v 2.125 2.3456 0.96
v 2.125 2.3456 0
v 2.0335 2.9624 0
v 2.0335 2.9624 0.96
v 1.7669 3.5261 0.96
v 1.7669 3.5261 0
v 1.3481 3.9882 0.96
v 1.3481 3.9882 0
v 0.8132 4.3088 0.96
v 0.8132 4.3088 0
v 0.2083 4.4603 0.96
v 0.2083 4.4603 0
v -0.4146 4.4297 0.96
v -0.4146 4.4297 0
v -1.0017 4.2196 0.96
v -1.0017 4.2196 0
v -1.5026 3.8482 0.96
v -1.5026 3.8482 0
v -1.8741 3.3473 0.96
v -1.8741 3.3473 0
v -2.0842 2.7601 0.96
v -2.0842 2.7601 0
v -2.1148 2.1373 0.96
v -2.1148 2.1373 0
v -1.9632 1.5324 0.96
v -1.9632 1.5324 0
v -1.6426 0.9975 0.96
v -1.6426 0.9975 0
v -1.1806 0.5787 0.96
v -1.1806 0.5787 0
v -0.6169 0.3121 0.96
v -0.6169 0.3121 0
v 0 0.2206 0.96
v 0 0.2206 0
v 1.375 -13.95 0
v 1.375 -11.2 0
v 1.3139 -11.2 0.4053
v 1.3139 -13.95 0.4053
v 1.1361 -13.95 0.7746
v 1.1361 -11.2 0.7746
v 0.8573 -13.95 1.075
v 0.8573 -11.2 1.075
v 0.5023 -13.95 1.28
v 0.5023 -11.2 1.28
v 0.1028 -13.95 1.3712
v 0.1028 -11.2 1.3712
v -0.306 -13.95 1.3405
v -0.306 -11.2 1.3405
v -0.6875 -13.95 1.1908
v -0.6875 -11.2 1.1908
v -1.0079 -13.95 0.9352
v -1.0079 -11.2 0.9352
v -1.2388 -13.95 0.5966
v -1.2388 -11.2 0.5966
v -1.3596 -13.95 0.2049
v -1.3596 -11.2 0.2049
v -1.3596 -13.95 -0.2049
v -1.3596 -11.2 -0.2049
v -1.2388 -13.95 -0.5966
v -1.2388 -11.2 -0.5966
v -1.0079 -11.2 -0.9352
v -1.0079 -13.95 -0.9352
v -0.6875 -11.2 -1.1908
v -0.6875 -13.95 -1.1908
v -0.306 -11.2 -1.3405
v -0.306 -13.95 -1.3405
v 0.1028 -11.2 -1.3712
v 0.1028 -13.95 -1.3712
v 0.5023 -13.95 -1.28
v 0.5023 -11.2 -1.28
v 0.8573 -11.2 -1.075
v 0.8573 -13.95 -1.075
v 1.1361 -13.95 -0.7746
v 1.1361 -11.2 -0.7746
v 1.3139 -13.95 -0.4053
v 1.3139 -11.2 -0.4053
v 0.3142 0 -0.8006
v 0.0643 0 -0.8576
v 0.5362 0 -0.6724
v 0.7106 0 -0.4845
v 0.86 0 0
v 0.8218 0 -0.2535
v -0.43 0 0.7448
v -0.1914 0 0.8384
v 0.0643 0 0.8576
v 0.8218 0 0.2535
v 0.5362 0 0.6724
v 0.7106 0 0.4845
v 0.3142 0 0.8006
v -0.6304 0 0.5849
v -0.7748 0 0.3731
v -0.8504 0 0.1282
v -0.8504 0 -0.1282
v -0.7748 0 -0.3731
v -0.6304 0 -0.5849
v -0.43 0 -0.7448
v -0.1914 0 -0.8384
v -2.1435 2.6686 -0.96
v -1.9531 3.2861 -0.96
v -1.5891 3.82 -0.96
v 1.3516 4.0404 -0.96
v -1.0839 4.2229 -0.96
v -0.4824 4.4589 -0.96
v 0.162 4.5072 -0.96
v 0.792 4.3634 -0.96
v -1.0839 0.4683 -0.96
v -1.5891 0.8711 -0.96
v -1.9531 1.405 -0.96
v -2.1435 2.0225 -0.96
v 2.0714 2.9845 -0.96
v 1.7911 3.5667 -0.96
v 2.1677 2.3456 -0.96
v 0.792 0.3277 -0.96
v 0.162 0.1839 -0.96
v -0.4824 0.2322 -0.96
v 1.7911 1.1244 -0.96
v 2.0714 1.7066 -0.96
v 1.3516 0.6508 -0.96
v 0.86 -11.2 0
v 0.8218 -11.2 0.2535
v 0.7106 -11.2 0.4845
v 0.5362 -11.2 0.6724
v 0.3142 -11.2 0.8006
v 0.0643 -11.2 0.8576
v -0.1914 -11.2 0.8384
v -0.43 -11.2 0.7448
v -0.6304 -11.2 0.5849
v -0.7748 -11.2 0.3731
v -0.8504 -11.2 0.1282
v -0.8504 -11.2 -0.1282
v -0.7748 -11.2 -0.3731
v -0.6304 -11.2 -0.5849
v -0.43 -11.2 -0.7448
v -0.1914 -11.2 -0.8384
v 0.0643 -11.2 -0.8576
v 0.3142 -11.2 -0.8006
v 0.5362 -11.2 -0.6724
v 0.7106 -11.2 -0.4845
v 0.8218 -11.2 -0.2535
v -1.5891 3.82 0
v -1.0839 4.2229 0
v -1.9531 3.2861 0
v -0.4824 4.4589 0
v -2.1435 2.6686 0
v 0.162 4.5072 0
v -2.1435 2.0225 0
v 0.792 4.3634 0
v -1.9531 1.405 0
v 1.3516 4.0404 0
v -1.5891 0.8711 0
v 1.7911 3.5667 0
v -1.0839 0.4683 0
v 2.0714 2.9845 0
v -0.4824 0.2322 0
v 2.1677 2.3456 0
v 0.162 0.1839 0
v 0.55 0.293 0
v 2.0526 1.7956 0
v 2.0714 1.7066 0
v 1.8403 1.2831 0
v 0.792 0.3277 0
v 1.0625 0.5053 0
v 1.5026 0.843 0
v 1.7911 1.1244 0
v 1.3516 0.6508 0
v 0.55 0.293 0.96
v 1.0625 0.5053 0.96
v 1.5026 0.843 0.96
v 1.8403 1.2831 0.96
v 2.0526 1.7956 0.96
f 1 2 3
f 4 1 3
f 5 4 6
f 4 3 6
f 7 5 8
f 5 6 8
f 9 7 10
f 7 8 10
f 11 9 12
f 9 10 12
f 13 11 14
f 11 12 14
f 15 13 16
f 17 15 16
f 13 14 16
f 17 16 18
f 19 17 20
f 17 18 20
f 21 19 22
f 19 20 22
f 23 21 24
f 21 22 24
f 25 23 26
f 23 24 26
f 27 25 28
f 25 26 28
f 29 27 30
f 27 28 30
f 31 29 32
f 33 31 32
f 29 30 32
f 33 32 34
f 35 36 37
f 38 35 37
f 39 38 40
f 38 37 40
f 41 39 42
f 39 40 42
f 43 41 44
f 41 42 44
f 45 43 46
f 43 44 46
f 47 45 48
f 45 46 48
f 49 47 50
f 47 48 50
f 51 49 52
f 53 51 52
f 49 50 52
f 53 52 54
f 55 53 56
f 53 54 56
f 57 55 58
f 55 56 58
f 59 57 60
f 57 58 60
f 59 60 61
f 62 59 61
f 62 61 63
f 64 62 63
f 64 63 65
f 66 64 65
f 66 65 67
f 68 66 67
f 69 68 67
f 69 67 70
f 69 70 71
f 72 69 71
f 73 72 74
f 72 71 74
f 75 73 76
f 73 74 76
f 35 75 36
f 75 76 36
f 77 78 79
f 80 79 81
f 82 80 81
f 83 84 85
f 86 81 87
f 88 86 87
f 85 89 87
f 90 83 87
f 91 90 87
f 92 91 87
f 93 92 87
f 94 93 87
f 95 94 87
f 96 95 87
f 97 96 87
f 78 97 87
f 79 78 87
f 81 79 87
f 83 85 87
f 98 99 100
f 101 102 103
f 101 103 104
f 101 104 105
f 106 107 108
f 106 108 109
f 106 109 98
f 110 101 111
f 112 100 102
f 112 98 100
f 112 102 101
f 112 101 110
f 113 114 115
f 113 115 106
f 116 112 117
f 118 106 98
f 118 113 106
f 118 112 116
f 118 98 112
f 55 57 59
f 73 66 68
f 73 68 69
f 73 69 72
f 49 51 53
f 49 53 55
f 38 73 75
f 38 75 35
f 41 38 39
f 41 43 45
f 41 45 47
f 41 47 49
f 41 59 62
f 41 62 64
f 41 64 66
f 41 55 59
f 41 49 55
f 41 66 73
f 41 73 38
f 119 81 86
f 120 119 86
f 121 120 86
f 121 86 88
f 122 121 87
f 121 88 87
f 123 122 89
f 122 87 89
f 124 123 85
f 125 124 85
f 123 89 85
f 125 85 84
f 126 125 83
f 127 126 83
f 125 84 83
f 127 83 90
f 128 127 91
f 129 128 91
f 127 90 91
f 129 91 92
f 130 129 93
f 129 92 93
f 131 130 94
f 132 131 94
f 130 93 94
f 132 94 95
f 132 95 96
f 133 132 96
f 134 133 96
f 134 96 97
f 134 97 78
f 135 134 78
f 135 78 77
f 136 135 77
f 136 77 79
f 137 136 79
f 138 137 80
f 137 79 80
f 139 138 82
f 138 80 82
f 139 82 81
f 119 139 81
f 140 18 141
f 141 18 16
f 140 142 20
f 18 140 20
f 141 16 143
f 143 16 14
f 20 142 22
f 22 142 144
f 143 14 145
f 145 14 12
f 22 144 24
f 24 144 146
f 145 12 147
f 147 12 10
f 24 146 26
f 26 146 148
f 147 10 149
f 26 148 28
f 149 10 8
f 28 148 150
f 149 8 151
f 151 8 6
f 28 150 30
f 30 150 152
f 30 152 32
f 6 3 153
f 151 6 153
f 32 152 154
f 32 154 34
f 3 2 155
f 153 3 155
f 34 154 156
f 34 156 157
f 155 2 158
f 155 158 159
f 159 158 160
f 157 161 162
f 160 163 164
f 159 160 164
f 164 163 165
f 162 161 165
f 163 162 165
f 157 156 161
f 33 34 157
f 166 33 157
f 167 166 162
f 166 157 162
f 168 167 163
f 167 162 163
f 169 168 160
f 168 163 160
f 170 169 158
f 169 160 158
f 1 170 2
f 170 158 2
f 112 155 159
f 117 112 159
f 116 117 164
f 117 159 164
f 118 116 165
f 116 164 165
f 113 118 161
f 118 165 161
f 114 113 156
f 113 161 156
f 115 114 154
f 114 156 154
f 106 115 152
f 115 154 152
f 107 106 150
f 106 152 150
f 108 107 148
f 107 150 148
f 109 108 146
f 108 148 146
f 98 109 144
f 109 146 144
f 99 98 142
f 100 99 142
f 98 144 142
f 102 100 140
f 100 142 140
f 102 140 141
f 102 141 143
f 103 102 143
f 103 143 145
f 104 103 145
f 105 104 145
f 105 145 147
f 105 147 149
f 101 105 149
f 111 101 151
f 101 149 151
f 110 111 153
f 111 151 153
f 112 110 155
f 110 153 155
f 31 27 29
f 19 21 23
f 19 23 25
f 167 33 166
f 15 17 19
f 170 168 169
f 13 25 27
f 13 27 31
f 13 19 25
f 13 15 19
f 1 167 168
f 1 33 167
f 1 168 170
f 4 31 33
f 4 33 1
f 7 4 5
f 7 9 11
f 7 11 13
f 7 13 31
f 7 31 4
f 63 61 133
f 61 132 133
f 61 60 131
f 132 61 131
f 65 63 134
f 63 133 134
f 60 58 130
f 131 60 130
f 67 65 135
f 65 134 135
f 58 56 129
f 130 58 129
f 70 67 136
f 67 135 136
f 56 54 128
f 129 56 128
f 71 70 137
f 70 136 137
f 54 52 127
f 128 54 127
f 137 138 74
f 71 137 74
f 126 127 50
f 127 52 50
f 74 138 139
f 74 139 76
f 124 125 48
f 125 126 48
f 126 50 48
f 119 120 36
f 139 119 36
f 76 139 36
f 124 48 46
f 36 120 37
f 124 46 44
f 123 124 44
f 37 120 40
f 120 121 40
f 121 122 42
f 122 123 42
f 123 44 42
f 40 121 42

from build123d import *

# Parameters (mm, degrees)
F0_R      = 0.86
F1_DEPTH  = 11.2
F2_R      = 1.375
F2_R_2    = 0.86
F1_FACE_R = 0.86
F3_DEPTH  = 2.75
F5_DEPTH  = 0.96
F6_R      = 2.167722
F7_DEPTH  = 0.96


with BuildPart() as f1:
    # F0 (on Front) → F1 (new body)
    with BuildSketch(Plane.XZ):
        Circle(F0_R)
    extrude(amount=F1_DEPTH)

    # F2 (on face) + F1_face (on face) → F3 (join)
    with BuildSketch(Plane.XZ.offset(11.2)):
        Circle(F2_R)
        Circle(F2_R_2, mode=Mode.SUBTRACT)
        Circle(F2_R_2)
    with BuildSketch(Plane.XZ.offset(11.2)):
        Circle(F1_FACE_R)
    extrude(amount=F3_DEPTH)


with BuildPart() as f5:
    # F4 (on Top) → F5 (new body)
    with BuildSketch(Plane.XY):
        with BuildLine():
            ThreePointArc((0, 0.220558), (1.502602, 0.842956), (2.125, 2.345558))
            ThreePointArc((2.125, 2.345558), (-1.502602, 3.84816), (0, 0.220558))
        make_face()
    extrude(amount=F5_DEPTH)

    # F6 (on face) → F7 (join)
    with BuildSketch(Plane(origin=(0, 0, 0), x_dir=(1, 0, 0), z_dir=(0, 0, -1))):
        with Locations((0, -2.345558)):
            Circle(F6_R)
    extrude(amount=F7_DEPTH)


solid = Compound([f1.part, f5.part])
